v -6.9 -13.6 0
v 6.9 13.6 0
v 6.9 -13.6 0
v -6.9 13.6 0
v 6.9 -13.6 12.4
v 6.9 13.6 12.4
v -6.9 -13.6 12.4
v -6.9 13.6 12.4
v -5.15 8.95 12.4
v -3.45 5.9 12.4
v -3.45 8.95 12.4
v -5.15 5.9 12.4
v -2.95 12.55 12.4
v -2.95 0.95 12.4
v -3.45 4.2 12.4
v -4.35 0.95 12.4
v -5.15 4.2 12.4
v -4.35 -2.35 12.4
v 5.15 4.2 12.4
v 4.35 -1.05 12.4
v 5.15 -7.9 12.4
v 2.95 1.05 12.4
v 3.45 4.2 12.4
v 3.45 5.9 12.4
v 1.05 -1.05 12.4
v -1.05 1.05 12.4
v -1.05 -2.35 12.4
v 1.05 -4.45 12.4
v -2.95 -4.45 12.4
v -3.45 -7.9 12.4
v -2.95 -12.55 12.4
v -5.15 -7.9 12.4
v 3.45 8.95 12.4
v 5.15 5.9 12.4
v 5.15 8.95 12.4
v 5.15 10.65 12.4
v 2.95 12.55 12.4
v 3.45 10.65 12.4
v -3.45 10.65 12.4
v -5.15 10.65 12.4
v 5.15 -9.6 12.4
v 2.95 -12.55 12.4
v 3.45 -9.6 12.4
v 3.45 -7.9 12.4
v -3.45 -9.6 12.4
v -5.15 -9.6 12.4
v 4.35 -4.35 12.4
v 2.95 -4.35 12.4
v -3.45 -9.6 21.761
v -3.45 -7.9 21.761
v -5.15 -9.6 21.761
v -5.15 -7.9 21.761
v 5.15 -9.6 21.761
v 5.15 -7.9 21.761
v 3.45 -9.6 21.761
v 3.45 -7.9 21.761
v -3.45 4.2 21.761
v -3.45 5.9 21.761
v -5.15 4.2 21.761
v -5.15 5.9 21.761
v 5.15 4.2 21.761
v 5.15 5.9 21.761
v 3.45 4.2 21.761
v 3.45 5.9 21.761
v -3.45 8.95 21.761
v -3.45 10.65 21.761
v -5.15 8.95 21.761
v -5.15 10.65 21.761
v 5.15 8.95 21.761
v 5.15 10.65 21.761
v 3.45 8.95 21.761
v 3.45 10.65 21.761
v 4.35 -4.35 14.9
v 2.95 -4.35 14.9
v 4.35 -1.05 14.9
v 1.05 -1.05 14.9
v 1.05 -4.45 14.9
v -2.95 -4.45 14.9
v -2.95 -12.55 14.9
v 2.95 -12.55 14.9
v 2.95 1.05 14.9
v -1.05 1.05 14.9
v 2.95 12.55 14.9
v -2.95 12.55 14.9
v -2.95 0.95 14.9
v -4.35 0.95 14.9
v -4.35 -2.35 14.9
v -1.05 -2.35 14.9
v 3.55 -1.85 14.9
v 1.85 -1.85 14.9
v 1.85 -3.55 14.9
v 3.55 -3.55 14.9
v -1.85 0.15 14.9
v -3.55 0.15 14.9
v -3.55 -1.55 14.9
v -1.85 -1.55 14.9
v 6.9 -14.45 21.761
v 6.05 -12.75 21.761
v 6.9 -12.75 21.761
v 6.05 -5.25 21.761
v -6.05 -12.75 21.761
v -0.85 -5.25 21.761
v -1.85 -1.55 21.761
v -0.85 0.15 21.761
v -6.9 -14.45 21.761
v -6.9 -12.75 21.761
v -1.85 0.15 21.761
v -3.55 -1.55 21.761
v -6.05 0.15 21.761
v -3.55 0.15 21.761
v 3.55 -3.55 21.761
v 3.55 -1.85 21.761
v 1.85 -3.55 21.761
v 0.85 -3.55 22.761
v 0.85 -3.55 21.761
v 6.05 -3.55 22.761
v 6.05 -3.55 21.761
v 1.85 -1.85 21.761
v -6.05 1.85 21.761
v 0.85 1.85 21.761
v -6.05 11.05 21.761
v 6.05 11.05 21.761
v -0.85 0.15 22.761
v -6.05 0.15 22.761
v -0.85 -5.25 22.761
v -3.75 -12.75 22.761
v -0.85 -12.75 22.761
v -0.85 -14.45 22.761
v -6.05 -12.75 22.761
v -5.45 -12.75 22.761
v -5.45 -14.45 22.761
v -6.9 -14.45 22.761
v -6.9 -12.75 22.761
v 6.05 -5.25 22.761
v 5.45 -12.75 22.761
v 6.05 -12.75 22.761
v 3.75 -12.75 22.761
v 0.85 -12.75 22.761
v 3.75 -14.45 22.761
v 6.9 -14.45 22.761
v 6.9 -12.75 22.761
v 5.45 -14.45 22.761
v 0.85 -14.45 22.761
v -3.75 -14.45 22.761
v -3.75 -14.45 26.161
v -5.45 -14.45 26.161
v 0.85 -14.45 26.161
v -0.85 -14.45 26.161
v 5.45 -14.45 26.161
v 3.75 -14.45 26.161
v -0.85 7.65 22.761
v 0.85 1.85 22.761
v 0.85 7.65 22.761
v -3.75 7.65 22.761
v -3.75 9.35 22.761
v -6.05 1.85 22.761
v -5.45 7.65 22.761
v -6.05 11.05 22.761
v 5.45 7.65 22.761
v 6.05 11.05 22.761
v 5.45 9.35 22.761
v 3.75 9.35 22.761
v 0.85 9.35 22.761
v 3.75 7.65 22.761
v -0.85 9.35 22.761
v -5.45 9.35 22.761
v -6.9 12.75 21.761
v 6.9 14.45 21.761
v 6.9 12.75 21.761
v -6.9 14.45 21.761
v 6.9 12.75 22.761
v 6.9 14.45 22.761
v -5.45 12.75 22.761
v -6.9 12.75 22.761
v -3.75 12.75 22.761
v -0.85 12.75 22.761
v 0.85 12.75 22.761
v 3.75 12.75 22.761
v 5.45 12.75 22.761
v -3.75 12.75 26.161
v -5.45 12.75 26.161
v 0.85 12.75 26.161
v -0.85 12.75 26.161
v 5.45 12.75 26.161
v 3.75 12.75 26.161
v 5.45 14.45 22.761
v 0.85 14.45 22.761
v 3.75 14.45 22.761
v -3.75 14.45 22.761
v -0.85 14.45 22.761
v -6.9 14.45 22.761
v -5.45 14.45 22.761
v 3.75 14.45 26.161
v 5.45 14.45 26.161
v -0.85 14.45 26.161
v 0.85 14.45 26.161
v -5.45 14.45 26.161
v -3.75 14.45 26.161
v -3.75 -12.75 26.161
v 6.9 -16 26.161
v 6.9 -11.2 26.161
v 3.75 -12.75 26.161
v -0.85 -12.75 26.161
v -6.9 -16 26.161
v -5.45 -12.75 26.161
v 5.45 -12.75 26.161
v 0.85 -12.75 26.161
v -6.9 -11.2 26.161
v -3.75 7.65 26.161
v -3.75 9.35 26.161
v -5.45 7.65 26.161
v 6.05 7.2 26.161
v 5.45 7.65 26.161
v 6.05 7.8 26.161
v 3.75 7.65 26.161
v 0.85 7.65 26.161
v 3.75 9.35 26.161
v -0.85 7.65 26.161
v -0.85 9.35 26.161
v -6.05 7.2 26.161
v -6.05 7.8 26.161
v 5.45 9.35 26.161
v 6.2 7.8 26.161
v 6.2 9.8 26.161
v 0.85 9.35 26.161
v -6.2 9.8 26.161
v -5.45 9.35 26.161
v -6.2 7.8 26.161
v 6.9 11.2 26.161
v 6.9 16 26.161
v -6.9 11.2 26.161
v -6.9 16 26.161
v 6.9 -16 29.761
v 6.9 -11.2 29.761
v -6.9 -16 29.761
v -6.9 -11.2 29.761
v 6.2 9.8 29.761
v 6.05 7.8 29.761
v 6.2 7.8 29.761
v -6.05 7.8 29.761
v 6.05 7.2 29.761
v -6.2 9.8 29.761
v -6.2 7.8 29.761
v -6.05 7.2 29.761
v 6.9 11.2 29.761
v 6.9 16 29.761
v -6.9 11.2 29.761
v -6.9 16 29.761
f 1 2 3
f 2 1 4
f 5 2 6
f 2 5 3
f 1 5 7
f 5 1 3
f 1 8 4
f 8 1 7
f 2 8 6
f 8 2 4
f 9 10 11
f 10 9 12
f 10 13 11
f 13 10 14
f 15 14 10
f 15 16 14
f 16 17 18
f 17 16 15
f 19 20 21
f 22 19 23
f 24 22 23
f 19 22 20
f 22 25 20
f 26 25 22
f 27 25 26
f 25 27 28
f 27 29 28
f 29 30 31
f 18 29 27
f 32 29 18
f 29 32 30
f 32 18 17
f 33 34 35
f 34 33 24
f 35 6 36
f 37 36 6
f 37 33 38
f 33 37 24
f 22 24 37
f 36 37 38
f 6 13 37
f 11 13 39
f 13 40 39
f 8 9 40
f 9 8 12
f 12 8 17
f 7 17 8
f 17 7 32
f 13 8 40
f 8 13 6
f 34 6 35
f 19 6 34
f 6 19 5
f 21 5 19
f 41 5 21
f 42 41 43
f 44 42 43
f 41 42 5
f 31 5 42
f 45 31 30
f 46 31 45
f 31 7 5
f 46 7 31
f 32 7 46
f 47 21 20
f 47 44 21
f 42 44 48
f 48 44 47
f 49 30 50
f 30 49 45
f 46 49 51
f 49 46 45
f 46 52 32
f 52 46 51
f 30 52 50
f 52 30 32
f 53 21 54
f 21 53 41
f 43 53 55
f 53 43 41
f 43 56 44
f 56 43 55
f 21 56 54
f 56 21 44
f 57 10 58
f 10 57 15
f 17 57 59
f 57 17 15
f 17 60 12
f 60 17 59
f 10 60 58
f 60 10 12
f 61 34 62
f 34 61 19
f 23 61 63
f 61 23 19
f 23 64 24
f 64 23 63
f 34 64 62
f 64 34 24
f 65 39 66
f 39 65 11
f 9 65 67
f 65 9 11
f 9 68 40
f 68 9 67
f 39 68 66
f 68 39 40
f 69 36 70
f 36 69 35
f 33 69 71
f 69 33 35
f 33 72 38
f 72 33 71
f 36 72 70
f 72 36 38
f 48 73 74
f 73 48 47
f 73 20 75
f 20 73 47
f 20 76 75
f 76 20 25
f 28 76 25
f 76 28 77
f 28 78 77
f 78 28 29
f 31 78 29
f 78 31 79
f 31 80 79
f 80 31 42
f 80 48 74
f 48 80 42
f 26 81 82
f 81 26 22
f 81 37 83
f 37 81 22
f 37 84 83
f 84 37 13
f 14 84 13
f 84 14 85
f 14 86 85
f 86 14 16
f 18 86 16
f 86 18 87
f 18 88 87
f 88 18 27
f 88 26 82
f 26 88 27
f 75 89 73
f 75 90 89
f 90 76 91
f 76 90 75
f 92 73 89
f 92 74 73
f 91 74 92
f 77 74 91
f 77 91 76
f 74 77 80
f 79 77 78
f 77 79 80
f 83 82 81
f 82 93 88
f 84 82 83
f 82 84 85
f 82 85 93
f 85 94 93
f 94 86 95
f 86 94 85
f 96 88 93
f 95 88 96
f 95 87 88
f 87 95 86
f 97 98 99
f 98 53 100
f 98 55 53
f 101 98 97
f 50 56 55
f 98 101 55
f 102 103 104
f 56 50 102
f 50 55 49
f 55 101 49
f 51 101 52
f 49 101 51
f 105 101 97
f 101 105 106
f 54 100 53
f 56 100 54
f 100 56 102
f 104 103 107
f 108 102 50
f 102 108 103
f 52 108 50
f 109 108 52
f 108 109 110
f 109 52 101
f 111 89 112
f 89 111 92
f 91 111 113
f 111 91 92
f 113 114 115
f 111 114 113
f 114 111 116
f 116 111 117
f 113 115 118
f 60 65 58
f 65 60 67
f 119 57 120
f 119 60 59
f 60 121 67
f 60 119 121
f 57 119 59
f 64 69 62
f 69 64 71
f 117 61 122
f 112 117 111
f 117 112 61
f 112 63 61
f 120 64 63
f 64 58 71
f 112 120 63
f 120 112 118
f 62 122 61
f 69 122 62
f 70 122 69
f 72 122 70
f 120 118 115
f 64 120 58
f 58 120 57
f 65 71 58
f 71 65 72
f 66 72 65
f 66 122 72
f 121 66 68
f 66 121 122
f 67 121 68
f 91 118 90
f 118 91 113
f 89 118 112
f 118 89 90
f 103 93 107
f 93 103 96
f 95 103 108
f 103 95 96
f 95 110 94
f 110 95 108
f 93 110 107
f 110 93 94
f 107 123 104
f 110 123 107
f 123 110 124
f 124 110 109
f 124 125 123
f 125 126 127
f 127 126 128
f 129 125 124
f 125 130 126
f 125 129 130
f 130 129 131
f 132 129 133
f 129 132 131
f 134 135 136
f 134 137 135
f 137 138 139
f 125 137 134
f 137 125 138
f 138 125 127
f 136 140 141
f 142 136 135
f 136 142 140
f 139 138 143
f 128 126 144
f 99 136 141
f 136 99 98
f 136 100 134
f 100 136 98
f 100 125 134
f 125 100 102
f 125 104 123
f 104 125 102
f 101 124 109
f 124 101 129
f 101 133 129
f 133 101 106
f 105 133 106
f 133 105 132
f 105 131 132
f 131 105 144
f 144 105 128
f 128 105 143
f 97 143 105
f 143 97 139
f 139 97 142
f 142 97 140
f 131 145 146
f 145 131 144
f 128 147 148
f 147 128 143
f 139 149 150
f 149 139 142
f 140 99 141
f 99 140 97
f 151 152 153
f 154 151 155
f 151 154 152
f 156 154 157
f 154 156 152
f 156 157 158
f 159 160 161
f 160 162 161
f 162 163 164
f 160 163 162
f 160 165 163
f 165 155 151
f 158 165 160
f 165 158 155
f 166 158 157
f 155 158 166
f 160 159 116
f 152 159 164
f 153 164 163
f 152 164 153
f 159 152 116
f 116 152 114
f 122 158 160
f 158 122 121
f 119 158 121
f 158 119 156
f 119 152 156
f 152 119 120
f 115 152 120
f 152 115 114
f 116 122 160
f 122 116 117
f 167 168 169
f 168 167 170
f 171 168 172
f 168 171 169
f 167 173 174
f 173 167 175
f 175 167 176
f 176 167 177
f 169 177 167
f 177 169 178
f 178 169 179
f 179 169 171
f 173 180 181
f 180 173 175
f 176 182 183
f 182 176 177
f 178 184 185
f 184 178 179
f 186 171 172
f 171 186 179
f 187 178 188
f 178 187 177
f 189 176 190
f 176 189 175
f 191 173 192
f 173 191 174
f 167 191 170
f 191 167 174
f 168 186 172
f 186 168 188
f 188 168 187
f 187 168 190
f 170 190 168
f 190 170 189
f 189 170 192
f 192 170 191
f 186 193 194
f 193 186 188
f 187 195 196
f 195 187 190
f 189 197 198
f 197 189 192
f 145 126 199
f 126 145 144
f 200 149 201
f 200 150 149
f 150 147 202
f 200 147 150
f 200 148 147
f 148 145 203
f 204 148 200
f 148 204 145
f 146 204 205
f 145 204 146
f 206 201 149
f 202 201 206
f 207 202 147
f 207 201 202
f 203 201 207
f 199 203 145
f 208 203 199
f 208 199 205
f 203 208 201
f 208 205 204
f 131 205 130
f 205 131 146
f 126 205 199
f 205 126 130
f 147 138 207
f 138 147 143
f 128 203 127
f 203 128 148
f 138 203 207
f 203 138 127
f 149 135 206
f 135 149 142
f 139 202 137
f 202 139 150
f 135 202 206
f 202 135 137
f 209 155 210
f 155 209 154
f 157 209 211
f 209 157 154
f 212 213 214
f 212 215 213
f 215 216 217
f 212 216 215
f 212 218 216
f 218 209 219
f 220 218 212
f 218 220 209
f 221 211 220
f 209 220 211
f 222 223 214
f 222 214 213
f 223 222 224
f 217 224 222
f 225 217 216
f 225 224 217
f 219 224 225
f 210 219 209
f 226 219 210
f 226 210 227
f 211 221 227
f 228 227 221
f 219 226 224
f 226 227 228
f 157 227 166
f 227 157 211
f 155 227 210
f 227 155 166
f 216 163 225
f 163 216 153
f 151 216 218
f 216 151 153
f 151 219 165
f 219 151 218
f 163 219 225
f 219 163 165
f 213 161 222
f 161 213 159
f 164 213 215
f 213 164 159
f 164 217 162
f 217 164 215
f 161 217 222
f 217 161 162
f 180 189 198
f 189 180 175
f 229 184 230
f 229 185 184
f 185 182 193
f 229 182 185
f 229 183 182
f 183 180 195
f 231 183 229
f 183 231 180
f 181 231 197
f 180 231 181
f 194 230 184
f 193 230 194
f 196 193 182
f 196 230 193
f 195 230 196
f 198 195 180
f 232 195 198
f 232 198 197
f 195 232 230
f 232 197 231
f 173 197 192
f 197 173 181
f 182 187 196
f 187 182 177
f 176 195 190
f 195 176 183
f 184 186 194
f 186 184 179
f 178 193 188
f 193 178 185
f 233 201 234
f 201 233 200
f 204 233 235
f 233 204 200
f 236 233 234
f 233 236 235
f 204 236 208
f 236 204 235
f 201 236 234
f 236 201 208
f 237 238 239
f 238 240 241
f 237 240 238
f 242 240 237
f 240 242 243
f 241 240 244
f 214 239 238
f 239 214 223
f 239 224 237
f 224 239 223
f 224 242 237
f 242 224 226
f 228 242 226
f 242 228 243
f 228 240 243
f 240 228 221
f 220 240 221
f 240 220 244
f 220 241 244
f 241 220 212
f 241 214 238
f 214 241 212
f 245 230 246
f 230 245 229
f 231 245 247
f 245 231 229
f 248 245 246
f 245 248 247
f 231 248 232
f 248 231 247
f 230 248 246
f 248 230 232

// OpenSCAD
// Generated by SolidPython 0.4.2 on 2020-09-29 23:21:05
//!OpenSCAD

scale(v = 0.0100000000) {
	translate(v = [-690, -1360, 0]) {
		union() {
			color(c = [0.4000000000, 0.4000000000, 0.4000000000]) {
				translate(v = [0, 0, 0]) {
					linear_extrude(height = 1000.0000000000) {
						polygon(paths = [[0, 1, 2, 3]], points = [[0, 0], [0, 2720], [1380, 2720], [1380, 0]]);
					}
				}
			}
			color(c = [0.2000000000, 0.6000000000, 0.2000000000]) {
				translate(v = [0, 0, 1000.0000000000]) {
					linear_extrude(height = 120.0000000000) {
						polygon(paths = [[0, 1, 2, 3]], points = [[0, 1305], [0, 2720], [1380, 2720], [1380, 1305]]);
					}
				}
			}
			color(c = [0.4000000000, 0.4000000000, 0.4000000000]) {
				translate(v = [0, 0, 1000.0000000000]) {
					linear_extrude(height = 120.0000000000) {
						polygon(paths = [[0, 1, 2, 3]], points = [[0, 0], [0, 1305], [1380, 1305], [1380, 0]]);
					}
				}
			}
			color(c = [0.9000000000, 0.6000000000, 0.6000000000]) {
				translate(v = [0, 0, 1120.0000000000]) {
					linear_extrude(height = 120.0000000000) {
						polygon(paths = [[0, 1, 2, 3]], points = [[135, 1615], [135, 2485], [395, 2485], [395, 1615]]);
					}
				}
			}
			color(c = [0.9000000000, 0.6000000000, 0.6000000000]) {
				translate(v = [0, 0, 1120.0000000000]) {
					linear_extrude(height = 120.0000000000) {
						polygon(paths = [[0, 1, 2, 3]], points = [[985, 1615], [985, 2485], [1245, 2485], [1245, 1615]]);
					}
				}
			}
			color(c = [0.9000000000, 0.6000000000, 0.9000000000]) {
				translate(v = [0, 0, 1120.0000000000]) {
					linear_extrude(height = 120.0000000000) {
						polygon(paths = [[0, 1, 2, 3]], points = [[135, 235], [135, 785], [395, 785], [395, 235]]);
					}
				}
			}
			color(c = [0.9000000000, 0.6000000000, 0.9000000000]) {
				translate(v = [0, 0, 1120.0000000000]) {
					linear_extrude(height = 120.0000000000) {
						polygon(paths = [[0, 1, 2, 3]], points = [[985, 235], [985, 785], [1245, 785], [1245, 235]]);
					}
				}
			}
			color(c = [0.2000000000, 0.6000000000, 0.2000000000]) {
				translate(v = [0, 0, 1120.0000000000]) {
					linear_extrude(height = 120.0000000000) {
						difference() {
							polygon(paths = [[0, 1, 2, 3]], points = [[0, 1305], [0, 2720], [1380, 2720], [1380, 1305]]);
							polygon(paths = [[0, 1, 2, 3]], points = [[135, 1615], [395, 1615], [395, 2485], [135, 2485]]);
							polygon(paths = [[0, 1, 2, 3]], points = [[985, 1615], [1245, 1615], [1245, 2485], [985, 2485]]);
						}
					}
				}
			}
			color(c = [0.4000000000, 0.4000000000, 0.4000000000]) {
				translate(v = [0, 0, 1120.0000000000]) {
					linear_extrude(height = 120.0000000000) {
						difference() {
							polygon(paths = [[0, 1, 2, 3]], points = [[0, 0], [0, 1305], [1380, 1305], [1380, 0]]);
							polygon(paths = [[0, 1, 2, 3]], points = [[135, 235], [395, 235], [395, 785], [135, 785]]);
							polygon(paths = [[0, 1, 2, 3]], points = [[985, 235], [1245, 235], [1245, 785], [985, 785]]);
						}
					}
				}
			}
			color(c = [0.1000000000, 0.1000000000, 0.1000000000]) {
				translate(v = [0, 0, 1240.0000000000]) {
					linear_extrude(height = 70.0000000000) {
						polygon(paths = [[0, 1, 2, 3]], points = [[175, 400], [175, 570], [345, 570], [345, 400]]);
					}
				}
			}
			color(c = [0.1000000000, 0.1000000000, 0.1000000000]) {
				translate(v = [0, 0, 1240.0000000000]) {
					linear_extrude(height = 70.0000000000) {
						polygon(paths = [[0, 1, 2, 3]], points = [[1035, 400], [1035, 570], [1205, 570], [1205, 400]]);
					}
				}
			}
			color(c = [0.1000000000, 0.1000000000, 0.1000000000]) {
				translate(v = [0, 0, 1240.0000000000]) {
					linear_extrude(height = 70.0000000000) {
						polygon(paths = [[0, 1, 2, 3]], points = [[175, 1780], [175, 1950], [345, 1950], [345, 1780]]);
					}
				}
			}
			color(c = [0.1000000000, 0.1000000000, 0.1000000000]) {
				translate(v = [0, 0, 1240.0000000000]) {
					linear_extrude(height = 70.0000000000) {
						polygon(paths = [[0, 1, 2, 3]], points = [[1035, 1780], [1035, 1950], [1205, 1950], [1205, 1780]]);
					}
				}
			}
			color(c = [0.1000000000, 0.1000000000, 0.1000000000]) {
				translate(v = [0, 0, 1240.0000000000]) {
					linear_extrude(height = 70.0000000000) {
						polygon(paths = [[0, 1, 2, 3]], points = [[175, 2255], [175, 2425], [345, 2425], [345, 2255]]);
					}
				}
			}
			color(c = [0.1000000000, 0.1000000000, 0.1000000000]) {
				translate(v = [0, 0, 1240.0000000000]) {
					linear_extrude(height = 70.0000000000) {
						polygon(paths = [[0, 1, 2, 3]], points = [[1035, 2255], [1035, 2425], [1205, 2425], [1205, 2255]]);
					}
				}
			}
			color(c = [1.0000000000, 1.0000000000, 1.0000000000]) {
				translate(v = [0, 0, 1240.0000000000]) {
					linear_extrude(height = 70.0000000000) {
						polygon(paths = [[0, 1, 2, 3, 4, 5, 6, 7]], points = [[395, 105], [395, 915], [795, 915], [795, 1255], [1125, 1255], [1125, 925], [985, 925], [985, 105]]);
					}
				}
			}
			color(c = [1.0000000000, 1.0000000000, 1.0000000000]) {
				translate(v = [0, 0, 1240.0000000000]) {
					linear_extrude(height = 70.0000000000) {
						polygon(paths = [[0, 1, 2, 3, 4, 5, 6, 7]], points = [[255, 1125], [255, 1455], [395, 1455], [395, 2615], [985, 2615], [985, 1465], [585, 1465], [585, 1125]]);
					}
				}
			}
			color(c = [0.1000000000, 0.1000000000, 0.1000000000]) {
				translate(v = [0, 0, 1310.0000000000]) {
					linear_extrude(height = 180.0000000000) {
						polygon(paths = [[0, 1, 2, 3]], points = [[175, 400], [175, 570], [345, 570], [345, 400]]);
					}
				}
			}
			color(c = [0.1000000000, 0.1000000000, 0.1000000000]) {
				translate(v = [0, 0, 1310.0000000000]) {
					linear_extrude(height = 180.0000000000) {
						polygon(paths = [[0, 1, 2, 3]], points = [[1035, 400], [1035, 570], [1205, 570], [1205, 400]]);
					}
				}
			}
			color(c = [0.1000000000, 0.1000000000, 0.1000000000]) {
				translate(v = [0, 0, 1310.0000000000]) {
					linear_extrude(height = 180.0000000000) {
						polygon(paths = [[0, 1, 2, 3]], points = [[175, 1780], [175, 1950], [345, 1950], [345, 1780]]);
					}
				}
			}
			color(c = [0.1000000000, 0.1000000000, 0.1000000000]) {
				translate(v = [0, 0, 1310.0000000000]) {
					linear_extrude(height = 180.0000000000) {
						polygon(paths = [[0, 1, 2, 3]], points = [[1035, 1780], [1035, 1950], [1205, 1950], [1205, 1780]]);
					}
				}
			}
			color(c = [0.1000000000, 0.1000000000, 0.1000000000]) {
				translate(v = [0, 0, 1310.0000000000]) {
					linear_extrude(height = 180.0000000000) {
						polygon(paths = [[0, 1, 2, 3]], points = [[175, 2255], [175, 2425], [345, 2425], [345, 2255]]);
					}
				}
			}
			color(c = [0.1000000000, 0.1000000000, 0.1000000000]) {
				translate(v = [0, 0, 1310.0000000000]) {
					linear_extrude(height = 180.0000000000) {
						polygon(paths = [[0, 1, 2, 3]], points = [[1035, 2255], [1035, 2425], [1205, 2425], [1205, 2255]]);
					}
				}
			}
			color(c = [0.7000000000, 0, 0]) {
				translate(v = [0, 0, 1310.0000000000]) {
					linear_extrude(height = 180.0000000000) {
						polygon(paths = [[0, 1, 2, 3, 4, 5, 6, 7]], points = [[395, 105], [395, 915], [795, 915], [795, 1255], [1125, 1255], [1125, 925], [985, 925], [985, 105]]);
					}
				}
			}
			color(c = [0.7000000000, 0, 0]) {
				translate(v = [0, 0, 1310.0000000000]) {
					linear_extrude(height = 180.0000000000) {
						polygon(paths = [[0, 1, 2, 3, 4, 5, 6, 7]], points = [[255, 1125], [255, 1455], [395, 1455], [395, 2615], [985, 2615], [985, 1465], [585, 1465], [585, 1125]]);
					}
				}
			}
			color(c = [0.1000000000, 0.1000000000, 0.1000000000]) {
				translate(v = [0, 0, 1490.0000000000]) {
					linear_extrude(height = 686.1000000000) {
						polygon(paths = [[0, 1, 2, 3]], points = [[175, 400], [175, 570], [345, 570], [345, 400]]);
					}
				}
			}
			color(c = [0.1000000000, 0.1000000000, 0.1000000000]) {
				translate(v = [0, 0, 1490.0000000000]) {
					linear_extrude(height = 686.1000000000) {
						polygon(paths = [[0, 1, 2, 3]], points = [[1035, 400], [1035, 570], [1205, 570], [1205, 400]]);
					}
				}
			}
			color(c = [0.1000000000, 0.1000000000, 0.1000000000]) {
				translate(v = [0, 0, 1490.0000000000]) {
					linear_extrude(height = 686.1000000000) {
						polygon(paths = [[0, 1, 2, 3]], points = [[875, 1005], [875, 1175], [1045, 1175], [1045, 1005]]);
					}
				}
			}
			color(c = [0.1000000000, 0.1000000000, 0.1000000000]) {
				translate(v = [0, 0, 1490.0000000000]) {
					linear_extrude(height = 686.1000000000) {
						polygon(paths = [[0, 1, 2, 3]], points = [[335, 1205], [335, 1375], [505, 1375], [505, 1205]]);
					}
				}
			}
			color(c = [0.1000000000, 0.1000000000, 0.1000000000]) {
				translate(v = [0, 0, 1490.0000000000]) {
					linear_extrude(height = 686.1000000000) {
						polygon(paths = [[0, 1, 2, 3]], points = [[175, 1780], [175, 1950], [345, 1950], [345, 1780]]);
					}
				}
			}
			color(c = [0.1000000000, 0.1000000000, 0.1000000000]) {
				translate(v = [0, 0, 1490.0000000000]) {
					linear_extrude(height = 686.1000000000) {
						polygon(paths = [[0, 1, 2, 3]], points = [[1035, 1780], [1035, 1950], [1205, 1950], [1205, 1780]]);
					}
				}
			}
			color(c = [0.1000000000, 0.1000000000, 0.1000000000]) {
				translate(v = [0, 0, 1490.0000000000]) {
					linear_extrude(height = 686.1000000000) {
						polygon(paths = [[0, 1, 2, 3]], points = [[175, 2255], [175, 2425], [345, 2425], [345, 2255]]);
					}
				}
			}
			color(c = [0.1000000000, 0.1000000000, 0.1000000000]) {
				translate(v = [0, 0, 1490.0000000000]) {
					linear_extrude(height = 686.1000000000) {
						polygon(paths = [[0, 1, 2, 3]], points = [[1035, 2255], [1035, 2425], [1205, 2425], [1205, 2255]]);
					}
				}
			}
			color(c = [0.9000000000, 0.6000000000, 0.6000000000]) {
				translate(v = [0, 0, 2176.1000000000]) {
					linear_extrude(height = 100.0000000000) {
						polygon(paths = [[0, 1, 2, 3, 4, 5, 6, 7, 8, 9]], points = [[0, -85], [0, 85], [85, 85], [85, 1375], [605, 1375], [605, 835], [1295, 835], [1295, 85], [1380, 85], [1380, -85]]);
					}
				}
			}
			color(c = [0.9000000000, 0.6000000000, 0.6000000000]) {
				translate(v = [0, 0, 2176.1000000000]) {
					linear_extrude(height = 100.0000000000) {
						polygon(paths = [[0, 1, 2, 3, 4, 5]], points = [[775, 1005], [775, 1545], [85, 1545], [85, 2465], [1295, 2465], [1295, 1005]]);
					}
				}
			}
			color(c = [0.9000000000, 0.6000000000, 0.6000000000]) {
				translate(v = [0, 0, 2176.1000000000]) {
					linear_extrude(height = 100.0000000000) {
						polygon(paths = [[0, 1, 2, 3]], points = [[0, 2635], [0, 2805], [1380, 2805], [1380, 2635]]);
					}
				}
			}
			color(c = [0.5000000000, 0.5000000000, 0.5000000000]) {
				translate(v = [0, 0, 2276.1000000000]) {
					linear_extrude(height = 340.0000000000) {
						polygon(paths = [[0, 1, 2, 3]], points = [[145, -85], [145, 85], [315, 85], [315, -85]]);
					}
				}
			}
			color(c = [0.5000000000, 0.5000000000, 0.5000000000]) {
				translate(v = [0, 0, 2276.1000000000]) {
					linear_extrude(height = 340.0000000000) {
						polygon(paths = [[0, 1, 2, 3]], points = [[605, -85], [605, 85], [775, 85], [775, -85]]);
					}
				}
			}
			color(c = [0.5000000000, 0.5000000000, 0.5000000000]) {
				translate(v = [0, 0, 2276.1000000000]) {
					linear_extrude(height = 340.0000000000) {
						polygon(paths = [[0, 1, 2, 3]], points = [[1065, -85], [1065, 85], [1235, 85], [1235, -85]]);
					}
				}
			}
			color(c = [0.5000000000, 0.5000000000, 0.5000000000]) {
				translate(v = [0, 0, 2276.1000000000]) {
					linear_extrude(height = 340.0000000000) {
						polygon(paths = [[0, 1, 2, 3]], points = [[145, 2125], [145, 2295], [315, 2295], [315, 2125]]);
					}
				}
			}
			color(c = [0.5000000000, 0.5000000000, 0.5000000000]) {
				translate(v = [0, 0, 2276.1000000000]) {
					linear_extrude(height = 340.0000000000) {
						polygon(paths = [[0, 1, 2, 3]], points = [[605, 2125], [605, 2295], [775, 2295], [775, 2125]]);
					}
				}
			}
			color(c = [0.5000000000, 0.5000000000, 0.5000000000]) {
				translate(v = [0, 0, 2276.1000000000]) {
					linear_extrude(height = 340.0000000000) {
						polygon(paths = [[0, 1, 2, 3]], points = [[1065, 2125], [1065, 2295], [1235, 2295], [1235, 2125]]);
					}
				}
			}
			color(c = [0.5000000000, 0.5000000000, 0.5000000000]) {
				translate(v = [0, 0, 2276.1000000000]) {
					linear_extrude(height = 340.0000000000) {
						polygon(paths = [[0, 1, 2, 3]], points = [[145, 2635], [145, 2805], [315, 2805], [315, 2635]]);
					}
				}
			}
			color(c = [0.5000000000, 0.5000000000, 0.5000000000]) {
				translate(v = [0, 0, 2276.1000000000]) {
					linear_extrude(height = 340.0000000000) {
						polygon(paths = [[0, 1, 2, 3]], points = [[605, 2635], [605, 2805], [775, 2805], [775, 2635]]);
					}
				}
			}
			color(c = [0.5000000000, 0.5000000000, 0.5000000000]) {
				translate(v = [0, 0, 2276.1000000000]) {
					linear_extrude(height = 340.0000000000) {
						polygon(paths = [[0, 1, 2, 3]], points = [[1065, 2635], [1065, 2805], [1235, 2805], [1235, 2635]]);
					}
				}
			}
			color(c = [0.3000000000, 0.3000000000, 1]) {
				translate(v = [0, 0, 2616.1000000000]) {
					linear_extrude(height = 360.0000000000) {
						polygon(paths = [[0, 1, 2, 3]], points = [[0, -240], [0, 240], [1380, 240], [1380, -240]]);
					}
				}
			}
			color(c = [0.3000000000, 0.3000000000, 1]) {
				translate(v = [0, 0, 2616.1000000000]) {
					linear_extrude(height = 360.0000000000) {
						polygon(paths = [[0, 1, 2, 3, 4, 5, 6, 7]], points = [[85, 2080], [85, 2140], [70, 2140], [70, 2340], [1310, 2340], [1310, 2140], [1295, 2140], [1295, 2080]]);
					}
				}
			}
			color(c = [0.3000000000, 0.3000000000, 1]) {
				translate(v = [0, 0, 2616.1000000000]) {
					linear_extrude(height = 360.0000000000) {
						polygon(paths = [[0, 1, 2, 3]], points = [[0, 2480], [0, 2960], [1380, 2960], [1380, 2480]]);
					}
				}
			}
		}
	}
}
